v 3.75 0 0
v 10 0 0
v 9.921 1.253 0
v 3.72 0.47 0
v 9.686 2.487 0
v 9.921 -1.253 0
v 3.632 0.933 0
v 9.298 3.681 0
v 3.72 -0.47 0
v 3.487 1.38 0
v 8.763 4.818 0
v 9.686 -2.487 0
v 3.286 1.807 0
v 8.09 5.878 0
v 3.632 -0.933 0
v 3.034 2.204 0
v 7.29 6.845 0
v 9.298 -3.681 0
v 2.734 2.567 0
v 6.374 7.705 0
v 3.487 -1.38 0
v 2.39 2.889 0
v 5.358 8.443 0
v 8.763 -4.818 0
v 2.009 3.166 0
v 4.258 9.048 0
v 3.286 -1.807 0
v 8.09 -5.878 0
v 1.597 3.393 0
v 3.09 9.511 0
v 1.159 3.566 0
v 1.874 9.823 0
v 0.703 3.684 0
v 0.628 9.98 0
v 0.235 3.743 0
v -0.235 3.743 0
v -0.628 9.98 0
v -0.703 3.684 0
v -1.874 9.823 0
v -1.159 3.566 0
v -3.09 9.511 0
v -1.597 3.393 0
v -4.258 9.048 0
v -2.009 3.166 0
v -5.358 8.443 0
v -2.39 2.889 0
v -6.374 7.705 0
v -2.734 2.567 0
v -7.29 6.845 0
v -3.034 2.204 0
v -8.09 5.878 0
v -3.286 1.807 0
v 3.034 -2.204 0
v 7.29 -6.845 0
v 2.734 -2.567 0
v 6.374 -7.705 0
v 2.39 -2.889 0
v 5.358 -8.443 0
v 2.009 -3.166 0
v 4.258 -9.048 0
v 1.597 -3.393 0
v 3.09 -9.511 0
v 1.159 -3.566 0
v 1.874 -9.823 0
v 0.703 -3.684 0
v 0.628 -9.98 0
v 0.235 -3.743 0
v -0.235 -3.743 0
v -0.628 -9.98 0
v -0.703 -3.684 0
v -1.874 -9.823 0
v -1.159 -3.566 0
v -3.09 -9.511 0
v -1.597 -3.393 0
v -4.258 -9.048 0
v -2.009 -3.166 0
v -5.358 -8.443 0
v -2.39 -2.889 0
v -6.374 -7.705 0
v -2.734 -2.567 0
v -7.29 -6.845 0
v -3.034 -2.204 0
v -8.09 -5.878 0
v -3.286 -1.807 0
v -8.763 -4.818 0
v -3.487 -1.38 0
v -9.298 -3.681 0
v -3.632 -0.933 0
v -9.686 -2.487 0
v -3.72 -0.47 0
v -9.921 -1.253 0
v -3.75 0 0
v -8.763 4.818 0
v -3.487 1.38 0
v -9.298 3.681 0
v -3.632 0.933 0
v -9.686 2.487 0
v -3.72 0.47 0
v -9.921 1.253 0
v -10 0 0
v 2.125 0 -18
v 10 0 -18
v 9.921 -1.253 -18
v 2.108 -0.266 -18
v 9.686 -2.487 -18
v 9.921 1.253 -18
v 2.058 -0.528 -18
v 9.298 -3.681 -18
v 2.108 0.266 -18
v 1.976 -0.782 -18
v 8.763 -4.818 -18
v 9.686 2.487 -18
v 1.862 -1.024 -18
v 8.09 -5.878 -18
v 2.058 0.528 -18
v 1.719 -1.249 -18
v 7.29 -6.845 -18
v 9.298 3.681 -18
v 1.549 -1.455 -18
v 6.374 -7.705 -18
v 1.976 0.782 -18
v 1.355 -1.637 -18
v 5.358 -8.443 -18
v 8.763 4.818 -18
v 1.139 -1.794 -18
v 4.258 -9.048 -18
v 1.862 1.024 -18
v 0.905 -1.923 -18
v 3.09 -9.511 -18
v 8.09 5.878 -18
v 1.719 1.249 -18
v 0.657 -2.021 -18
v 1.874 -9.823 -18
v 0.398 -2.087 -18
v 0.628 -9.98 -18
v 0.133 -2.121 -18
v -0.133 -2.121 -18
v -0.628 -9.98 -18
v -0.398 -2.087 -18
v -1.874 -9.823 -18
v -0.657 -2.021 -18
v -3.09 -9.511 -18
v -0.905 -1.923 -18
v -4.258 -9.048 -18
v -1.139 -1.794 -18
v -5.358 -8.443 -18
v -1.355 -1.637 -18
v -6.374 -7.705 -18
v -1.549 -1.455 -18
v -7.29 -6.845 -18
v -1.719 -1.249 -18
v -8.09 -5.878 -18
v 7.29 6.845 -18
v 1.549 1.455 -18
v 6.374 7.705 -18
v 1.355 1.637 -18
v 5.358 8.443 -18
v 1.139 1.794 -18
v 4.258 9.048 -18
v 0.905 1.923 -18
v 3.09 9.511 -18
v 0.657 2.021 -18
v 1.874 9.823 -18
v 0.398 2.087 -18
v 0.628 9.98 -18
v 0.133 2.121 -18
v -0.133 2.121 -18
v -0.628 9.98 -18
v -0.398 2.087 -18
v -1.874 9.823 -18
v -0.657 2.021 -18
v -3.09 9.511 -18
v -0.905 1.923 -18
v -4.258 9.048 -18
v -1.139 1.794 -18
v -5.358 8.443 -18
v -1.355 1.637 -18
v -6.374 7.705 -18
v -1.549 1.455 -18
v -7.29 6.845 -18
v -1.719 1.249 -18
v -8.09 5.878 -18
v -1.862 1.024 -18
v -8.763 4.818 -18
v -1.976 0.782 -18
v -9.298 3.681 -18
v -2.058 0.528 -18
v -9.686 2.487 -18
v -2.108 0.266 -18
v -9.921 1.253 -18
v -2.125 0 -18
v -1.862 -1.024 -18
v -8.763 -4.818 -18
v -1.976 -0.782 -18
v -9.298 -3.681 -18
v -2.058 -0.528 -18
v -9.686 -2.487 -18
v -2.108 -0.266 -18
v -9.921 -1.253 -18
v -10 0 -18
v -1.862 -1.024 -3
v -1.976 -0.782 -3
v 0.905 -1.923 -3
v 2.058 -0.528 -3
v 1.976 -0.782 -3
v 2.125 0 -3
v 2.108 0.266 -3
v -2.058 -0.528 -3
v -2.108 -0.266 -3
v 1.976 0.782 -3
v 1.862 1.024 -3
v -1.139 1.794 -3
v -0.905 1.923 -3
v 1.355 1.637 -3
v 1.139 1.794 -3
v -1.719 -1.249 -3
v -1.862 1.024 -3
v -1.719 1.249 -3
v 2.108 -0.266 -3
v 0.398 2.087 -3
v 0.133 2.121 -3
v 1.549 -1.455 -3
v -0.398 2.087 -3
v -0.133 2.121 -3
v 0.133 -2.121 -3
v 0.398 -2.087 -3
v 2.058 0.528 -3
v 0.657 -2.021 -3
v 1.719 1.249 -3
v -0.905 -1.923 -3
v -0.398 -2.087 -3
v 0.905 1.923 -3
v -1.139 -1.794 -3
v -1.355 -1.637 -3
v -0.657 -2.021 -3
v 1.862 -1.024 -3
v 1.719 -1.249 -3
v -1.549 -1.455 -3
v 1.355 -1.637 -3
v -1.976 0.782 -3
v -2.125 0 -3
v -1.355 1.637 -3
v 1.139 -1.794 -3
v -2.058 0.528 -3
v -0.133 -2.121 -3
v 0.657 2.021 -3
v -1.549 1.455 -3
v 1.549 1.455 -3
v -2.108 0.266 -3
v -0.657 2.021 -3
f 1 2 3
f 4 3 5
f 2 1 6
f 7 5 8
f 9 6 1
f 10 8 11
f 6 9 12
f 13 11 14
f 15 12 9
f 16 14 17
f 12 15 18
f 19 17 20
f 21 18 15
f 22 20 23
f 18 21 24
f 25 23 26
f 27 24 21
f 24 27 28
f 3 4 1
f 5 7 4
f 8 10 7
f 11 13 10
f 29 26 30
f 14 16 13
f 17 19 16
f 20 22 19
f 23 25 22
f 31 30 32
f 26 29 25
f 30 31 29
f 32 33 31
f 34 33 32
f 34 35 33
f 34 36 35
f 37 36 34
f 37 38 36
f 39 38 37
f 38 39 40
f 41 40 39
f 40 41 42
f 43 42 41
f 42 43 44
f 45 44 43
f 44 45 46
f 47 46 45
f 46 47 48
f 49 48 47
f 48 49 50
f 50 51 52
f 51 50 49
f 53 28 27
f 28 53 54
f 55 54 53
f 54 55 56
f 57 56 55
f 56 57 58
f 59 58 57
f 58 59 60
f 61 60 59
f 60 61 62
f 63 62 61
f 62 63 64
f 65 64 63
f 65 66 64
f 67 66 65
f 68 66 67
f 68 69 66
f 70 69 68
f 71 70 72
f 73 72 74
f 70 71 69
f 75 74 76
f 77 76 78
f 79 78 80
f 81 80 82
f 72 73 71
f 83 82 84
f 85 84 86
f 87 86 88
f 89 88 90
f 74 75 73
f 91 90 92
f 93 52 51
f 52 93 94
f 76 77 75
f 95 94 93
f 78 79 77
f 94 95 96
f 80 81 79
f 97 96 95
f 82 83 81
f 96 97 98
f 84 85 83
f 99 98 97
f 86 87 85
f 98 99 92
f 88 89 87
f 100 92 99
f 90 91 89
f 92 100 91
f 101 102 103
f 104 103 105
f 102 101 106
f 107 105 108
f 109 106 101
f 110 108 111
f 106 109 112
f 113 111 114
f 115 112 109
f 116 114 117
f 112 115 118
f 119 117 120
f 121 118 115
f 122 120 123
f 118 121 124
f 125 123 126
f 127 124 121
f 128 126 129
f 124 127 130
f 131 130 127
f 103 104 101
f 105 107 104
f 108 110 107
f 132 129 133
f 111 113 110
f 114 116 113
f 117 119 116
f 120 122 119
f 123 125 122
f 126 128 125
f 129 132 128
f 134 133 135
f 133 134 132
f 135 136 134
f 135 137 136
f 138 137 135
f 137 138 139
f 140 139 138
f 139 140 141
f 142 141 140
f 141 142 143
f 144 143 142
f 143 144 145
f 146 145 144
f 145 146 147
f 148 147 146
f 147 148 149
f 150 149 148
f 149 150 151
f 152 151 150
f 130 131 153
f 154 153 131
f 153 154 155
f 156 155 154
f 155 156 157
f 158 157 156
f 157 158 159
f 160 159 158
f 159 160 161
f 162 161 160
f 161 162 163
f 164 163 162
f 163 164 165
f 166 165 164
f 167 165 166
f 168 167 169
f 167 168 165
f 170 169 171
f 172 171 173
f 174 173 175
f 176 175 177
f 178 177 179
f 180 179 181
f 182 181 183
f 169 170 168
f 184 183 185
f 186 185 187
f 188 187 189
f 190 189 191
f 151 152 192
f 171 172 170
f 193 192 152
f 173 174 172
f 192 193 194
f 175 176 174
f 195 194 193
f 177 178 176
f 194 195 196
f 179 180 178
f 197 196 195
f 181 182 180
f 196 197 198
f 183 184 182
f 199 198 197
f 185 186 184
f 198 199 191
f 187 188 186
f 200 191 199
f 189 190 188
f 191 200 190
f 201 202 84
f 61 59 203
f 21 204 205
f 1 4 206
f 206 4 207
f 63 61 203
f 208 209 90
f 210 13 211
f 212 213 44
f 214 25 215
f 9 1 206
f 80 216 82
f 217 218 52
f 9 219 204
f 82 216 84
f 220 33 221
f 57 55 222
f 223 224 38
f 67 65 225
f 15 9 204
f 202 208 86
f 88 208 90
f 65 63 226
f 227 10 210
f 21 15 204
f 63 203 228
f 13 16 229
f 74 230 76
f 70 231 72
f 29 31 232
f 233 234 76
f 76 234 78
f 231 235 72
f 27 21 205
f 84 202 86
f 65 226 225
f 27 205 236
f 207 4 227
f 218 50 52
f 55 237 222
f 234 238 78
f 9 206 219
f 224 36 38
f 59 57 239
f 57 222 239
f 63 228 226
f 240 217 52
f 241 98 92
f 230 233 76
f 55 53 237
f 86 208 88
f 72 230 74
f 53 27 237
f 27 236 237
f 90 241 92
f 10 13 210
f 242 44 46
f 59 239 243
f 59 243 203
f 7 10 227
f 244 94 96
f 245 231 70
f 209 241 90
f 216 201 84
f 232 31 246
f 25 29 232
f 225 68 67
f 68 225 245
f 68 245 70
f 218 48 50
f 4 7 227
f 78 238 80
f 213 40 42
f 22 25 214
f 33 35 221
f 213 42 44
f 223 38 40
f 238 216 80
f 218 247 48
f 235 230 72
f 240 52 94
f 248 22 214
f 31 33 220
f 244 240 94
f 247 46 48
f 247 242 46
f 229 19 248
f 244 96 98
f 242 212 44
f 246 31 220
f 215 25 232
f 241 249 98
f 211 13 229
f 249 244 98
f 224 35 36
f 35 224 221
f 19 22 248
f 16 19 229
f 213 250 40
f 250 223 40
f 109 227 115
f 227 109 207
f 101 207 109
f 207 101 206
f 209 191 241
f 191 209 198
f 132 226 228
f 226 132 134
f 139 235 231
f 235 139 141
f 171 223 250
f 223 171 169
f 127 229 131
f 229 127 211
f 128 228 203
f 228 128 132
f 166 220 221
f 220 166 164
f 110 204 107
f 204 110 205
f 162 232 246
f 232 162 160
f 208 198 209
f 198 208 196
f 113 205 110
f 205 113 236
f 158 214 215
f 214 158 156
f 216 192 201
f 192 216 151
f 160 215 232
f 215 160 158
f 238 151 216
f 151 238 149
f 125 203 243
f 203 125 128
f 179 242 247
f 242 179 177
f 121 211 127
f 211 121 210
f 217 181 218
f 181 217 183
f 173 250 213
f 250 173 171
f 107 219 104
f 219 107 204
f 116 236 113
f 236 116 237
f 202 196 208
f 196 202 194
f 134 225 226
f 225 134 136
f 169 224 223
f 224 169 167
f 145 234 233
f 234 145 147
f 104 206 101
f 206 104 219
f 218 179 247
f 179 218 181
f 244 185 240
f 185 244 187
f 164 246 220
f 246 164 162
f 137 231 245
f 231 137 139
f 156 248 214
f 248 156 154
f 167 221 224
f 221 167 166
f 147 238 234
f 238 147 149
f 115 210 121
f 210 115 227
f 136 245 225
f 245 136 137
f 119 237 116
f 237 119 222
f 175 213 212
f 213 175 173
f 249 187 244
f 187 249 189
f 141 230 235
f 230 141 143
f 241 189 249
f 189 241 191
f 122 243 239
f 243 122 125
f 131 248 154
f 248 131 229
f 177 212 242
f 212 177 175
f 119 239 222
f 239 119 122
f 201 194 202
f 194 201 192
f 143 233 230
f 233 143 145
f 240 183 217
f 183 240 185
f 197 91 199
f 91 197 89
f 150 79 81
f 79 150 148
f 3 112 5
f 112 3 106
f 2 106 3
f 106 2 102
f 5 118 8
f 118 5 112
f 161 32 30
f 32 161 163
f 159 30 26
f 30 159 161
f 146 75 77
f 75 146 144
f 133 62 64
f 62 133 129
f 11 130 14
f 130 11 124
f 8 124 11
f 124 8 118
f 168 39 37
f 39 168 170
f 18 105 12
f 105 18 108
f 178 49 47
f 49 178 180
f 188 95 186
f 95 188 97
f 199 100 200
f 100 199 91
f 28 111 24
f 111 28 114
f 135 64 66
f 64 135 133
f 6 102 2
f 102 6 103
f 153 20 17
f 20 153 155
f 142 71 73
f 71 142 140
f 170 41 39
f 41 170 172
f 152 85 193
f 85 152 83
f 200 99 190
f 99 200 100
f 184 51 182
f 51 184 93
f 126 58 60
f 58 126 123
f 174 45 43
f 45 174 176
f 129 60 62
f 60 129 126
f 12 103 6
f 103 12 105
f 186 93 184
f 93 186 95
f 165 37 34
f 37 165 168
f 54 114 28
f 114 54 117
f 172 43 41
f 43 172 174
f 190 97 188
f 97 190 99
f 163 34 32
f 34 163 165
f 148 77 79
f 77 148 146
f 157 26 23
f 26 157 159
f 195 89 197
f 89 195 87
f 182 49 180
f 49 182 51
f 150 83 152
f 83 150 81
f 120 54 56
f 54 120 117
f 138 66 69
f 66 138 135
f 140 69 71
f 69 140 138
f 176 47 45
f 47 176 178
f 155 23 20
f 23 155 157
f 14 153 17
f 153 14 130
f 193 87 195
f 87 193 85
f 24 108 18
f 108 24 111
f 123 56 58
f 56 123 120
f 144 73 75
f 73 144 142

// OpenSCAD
$fn = 50;


difference() {
	union() {
		translate(v = [0, 0, -18.0000000000]) {
			cylinder(h = 18, r = 10.0000000000);
		}
		cylinder(h = 0, r = 13.0000000000);
	}
	union() {
		translate(v = [0, 0, 0]) {
			rotate(a = [0, 0, 0]) {
				difference() {
					union() {
						#translate(v = [0, 0, -18.0000000000]) {
							cylinder(h = 18, r = 2.0000000000);
						}
						#translate(v = [0, 0, -3]) {
							cylinder(h = 3, r = 10.0000000000, r1 = 2.1250000000, r2 = 3.7500000000);
						}
						#translate(v = [0, 0, -18.0000000000]) {
							cylinder(h = 18, r = 2.1250000000);
						}
						#translate(v = [0, 0, -18.0000000000]) {
							cylinder(h = 18, r = 2.0000000000);
						}
					}
					union();
				}
			}
		}
	}
}
